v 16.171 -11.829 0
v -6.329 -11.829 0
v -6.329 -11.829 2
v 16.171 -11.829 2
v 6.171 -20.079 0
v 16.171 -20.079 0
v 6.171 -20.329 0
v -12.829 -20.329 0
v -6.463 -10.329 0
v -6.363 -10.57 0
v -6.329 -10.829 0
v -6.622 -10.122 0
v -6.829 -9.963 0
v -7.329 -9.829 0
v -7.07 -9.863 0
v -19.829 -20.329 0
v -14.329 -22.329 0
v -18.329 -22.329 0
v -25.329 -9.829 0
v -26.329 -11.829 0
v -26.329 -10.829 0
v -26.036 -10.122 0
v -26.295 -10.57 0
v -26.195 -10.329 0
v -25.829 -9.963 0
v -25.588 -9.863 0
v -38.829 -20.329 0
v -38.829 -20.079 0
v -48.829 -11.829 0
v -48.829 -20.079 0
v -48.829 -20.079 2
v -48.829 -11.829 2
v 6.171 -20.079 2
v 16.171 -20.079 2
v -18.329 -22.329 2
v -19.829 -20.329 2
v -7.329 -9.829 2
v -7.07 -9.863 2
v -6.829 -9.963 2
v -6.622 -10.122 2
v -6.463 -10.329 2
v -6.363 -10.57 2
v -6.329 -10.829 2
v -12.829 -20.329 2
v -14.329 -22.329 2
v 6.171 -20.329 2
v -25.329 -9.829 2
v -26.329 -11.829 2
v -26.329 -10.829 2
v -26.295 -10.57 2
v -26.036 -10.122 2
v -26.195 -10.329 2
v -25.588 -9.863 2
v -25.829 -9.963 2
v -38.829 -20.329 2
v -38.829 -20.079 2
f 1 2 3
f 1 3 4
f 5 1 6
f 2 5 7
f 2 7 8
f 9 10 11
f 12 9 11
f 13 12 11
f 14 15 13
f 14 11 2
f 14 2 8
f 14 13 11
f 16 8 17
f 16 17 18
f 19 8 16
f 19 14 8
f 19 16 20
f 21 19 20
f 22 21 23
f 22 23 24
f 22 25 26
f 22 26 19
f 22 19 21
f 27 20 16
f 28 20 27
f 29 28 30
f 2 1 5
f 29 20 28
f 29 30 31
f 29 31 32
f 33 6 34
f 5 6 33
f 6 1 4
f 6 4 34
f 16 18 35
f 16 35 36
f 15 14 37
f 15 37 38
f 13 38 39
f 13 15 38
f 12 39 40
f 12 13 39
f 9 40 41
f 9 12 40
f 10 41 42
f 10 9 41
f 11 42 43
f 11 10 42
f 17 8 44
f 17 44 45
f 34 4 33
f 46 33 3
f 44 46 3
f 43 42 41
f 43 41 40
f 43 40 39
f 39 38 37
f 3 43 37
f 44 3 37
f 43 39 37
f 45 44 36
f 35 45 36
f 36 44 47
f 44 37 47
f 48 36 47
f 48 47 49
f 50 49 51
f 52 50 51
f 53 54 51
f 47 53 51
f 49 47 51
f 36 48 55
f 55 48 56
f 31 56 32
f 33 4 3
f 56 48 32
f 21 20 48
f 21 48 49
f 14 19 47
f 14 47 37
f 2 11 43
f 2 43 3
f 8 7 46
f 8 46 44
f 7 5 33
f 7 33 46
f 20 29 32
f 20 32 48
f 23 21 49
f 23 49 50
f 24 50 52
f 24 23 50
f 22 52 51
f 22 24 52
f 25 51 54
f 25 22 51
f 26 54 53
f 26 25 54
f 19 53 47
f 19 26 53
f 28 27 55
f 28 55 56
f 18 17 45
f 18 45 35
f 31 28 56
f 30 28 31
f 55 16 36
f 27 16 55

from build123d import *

# Parameters (mm, degrees)
BOSS_EXTRUDE1_DEPTH = 2


with BuildPart() as part:
    # Sketch1 → Boss-Extrude1 (new body)
    with BuildSketch(Plane.XY):
        with BuildLine():
            Line((-26.329238207, -11.829238207), (-26.329238207, -10.829238207))
            ThreePointArc((-26.329238207, -10.829238207), (-26.036344989, -10.122131426), (-25.329238207, -9.829238207))
            Line((-25.329238207, -9.829238207), (-7.329238207, -9.829238207))
            ThreePointArc((-7.329238207, -9.829238207), (-6.622131426, -10.122131426), (-6.329238207, -10.829238207))
            Line((-6.329238207, -10.829238207), (-6.329238207, -11.829238207))
            Line((-6.329238207, -11.829238207), (16.170761793, -11.829238207))
            Line((16.170761793, -11.829238207), (16.170761793, -20.079238207))
            Line((16.170761793, -20.079238207), (6.170761793, -20.079238207))
            Line((6.170761793, -20.079238207), (6.170761793, -20.329238207))
            Line((6.170761793, -20.329238207), (-12.829238207, -20.329238207))
            Line((-12.829238207, -20.329238207), (-14.329238207, -22.329238207))
            Line((-14.329238207, -22.329238207), (-16.329238207, -22.329238207))
            Line((-16.329238207, -22.329238207), (-18.329238207, -22.329238207))
            Line((-18.329238207, -22.329238207), (-19.829238207, -20.329238207))
            Line((-19.829238207, -20.329238207), (-38.829238207, -20.329238207))
            Line((-38.829238207, -20.329238207), (-38.829238207, -20.079238207))
            Line((-38.829238207, -20.079238207), (-48.829238207, -20.079238207))
            Line((-48.829238207, -20.079238207), (-48.829238207, -11.829238207))
            Line((-48.829238207, -11.829238207), (-26.329238207, -11.829238207))
        make_face()
    extrude(amount=BOSS_EXTRUDE1_DEPTH)


solid = part.part
